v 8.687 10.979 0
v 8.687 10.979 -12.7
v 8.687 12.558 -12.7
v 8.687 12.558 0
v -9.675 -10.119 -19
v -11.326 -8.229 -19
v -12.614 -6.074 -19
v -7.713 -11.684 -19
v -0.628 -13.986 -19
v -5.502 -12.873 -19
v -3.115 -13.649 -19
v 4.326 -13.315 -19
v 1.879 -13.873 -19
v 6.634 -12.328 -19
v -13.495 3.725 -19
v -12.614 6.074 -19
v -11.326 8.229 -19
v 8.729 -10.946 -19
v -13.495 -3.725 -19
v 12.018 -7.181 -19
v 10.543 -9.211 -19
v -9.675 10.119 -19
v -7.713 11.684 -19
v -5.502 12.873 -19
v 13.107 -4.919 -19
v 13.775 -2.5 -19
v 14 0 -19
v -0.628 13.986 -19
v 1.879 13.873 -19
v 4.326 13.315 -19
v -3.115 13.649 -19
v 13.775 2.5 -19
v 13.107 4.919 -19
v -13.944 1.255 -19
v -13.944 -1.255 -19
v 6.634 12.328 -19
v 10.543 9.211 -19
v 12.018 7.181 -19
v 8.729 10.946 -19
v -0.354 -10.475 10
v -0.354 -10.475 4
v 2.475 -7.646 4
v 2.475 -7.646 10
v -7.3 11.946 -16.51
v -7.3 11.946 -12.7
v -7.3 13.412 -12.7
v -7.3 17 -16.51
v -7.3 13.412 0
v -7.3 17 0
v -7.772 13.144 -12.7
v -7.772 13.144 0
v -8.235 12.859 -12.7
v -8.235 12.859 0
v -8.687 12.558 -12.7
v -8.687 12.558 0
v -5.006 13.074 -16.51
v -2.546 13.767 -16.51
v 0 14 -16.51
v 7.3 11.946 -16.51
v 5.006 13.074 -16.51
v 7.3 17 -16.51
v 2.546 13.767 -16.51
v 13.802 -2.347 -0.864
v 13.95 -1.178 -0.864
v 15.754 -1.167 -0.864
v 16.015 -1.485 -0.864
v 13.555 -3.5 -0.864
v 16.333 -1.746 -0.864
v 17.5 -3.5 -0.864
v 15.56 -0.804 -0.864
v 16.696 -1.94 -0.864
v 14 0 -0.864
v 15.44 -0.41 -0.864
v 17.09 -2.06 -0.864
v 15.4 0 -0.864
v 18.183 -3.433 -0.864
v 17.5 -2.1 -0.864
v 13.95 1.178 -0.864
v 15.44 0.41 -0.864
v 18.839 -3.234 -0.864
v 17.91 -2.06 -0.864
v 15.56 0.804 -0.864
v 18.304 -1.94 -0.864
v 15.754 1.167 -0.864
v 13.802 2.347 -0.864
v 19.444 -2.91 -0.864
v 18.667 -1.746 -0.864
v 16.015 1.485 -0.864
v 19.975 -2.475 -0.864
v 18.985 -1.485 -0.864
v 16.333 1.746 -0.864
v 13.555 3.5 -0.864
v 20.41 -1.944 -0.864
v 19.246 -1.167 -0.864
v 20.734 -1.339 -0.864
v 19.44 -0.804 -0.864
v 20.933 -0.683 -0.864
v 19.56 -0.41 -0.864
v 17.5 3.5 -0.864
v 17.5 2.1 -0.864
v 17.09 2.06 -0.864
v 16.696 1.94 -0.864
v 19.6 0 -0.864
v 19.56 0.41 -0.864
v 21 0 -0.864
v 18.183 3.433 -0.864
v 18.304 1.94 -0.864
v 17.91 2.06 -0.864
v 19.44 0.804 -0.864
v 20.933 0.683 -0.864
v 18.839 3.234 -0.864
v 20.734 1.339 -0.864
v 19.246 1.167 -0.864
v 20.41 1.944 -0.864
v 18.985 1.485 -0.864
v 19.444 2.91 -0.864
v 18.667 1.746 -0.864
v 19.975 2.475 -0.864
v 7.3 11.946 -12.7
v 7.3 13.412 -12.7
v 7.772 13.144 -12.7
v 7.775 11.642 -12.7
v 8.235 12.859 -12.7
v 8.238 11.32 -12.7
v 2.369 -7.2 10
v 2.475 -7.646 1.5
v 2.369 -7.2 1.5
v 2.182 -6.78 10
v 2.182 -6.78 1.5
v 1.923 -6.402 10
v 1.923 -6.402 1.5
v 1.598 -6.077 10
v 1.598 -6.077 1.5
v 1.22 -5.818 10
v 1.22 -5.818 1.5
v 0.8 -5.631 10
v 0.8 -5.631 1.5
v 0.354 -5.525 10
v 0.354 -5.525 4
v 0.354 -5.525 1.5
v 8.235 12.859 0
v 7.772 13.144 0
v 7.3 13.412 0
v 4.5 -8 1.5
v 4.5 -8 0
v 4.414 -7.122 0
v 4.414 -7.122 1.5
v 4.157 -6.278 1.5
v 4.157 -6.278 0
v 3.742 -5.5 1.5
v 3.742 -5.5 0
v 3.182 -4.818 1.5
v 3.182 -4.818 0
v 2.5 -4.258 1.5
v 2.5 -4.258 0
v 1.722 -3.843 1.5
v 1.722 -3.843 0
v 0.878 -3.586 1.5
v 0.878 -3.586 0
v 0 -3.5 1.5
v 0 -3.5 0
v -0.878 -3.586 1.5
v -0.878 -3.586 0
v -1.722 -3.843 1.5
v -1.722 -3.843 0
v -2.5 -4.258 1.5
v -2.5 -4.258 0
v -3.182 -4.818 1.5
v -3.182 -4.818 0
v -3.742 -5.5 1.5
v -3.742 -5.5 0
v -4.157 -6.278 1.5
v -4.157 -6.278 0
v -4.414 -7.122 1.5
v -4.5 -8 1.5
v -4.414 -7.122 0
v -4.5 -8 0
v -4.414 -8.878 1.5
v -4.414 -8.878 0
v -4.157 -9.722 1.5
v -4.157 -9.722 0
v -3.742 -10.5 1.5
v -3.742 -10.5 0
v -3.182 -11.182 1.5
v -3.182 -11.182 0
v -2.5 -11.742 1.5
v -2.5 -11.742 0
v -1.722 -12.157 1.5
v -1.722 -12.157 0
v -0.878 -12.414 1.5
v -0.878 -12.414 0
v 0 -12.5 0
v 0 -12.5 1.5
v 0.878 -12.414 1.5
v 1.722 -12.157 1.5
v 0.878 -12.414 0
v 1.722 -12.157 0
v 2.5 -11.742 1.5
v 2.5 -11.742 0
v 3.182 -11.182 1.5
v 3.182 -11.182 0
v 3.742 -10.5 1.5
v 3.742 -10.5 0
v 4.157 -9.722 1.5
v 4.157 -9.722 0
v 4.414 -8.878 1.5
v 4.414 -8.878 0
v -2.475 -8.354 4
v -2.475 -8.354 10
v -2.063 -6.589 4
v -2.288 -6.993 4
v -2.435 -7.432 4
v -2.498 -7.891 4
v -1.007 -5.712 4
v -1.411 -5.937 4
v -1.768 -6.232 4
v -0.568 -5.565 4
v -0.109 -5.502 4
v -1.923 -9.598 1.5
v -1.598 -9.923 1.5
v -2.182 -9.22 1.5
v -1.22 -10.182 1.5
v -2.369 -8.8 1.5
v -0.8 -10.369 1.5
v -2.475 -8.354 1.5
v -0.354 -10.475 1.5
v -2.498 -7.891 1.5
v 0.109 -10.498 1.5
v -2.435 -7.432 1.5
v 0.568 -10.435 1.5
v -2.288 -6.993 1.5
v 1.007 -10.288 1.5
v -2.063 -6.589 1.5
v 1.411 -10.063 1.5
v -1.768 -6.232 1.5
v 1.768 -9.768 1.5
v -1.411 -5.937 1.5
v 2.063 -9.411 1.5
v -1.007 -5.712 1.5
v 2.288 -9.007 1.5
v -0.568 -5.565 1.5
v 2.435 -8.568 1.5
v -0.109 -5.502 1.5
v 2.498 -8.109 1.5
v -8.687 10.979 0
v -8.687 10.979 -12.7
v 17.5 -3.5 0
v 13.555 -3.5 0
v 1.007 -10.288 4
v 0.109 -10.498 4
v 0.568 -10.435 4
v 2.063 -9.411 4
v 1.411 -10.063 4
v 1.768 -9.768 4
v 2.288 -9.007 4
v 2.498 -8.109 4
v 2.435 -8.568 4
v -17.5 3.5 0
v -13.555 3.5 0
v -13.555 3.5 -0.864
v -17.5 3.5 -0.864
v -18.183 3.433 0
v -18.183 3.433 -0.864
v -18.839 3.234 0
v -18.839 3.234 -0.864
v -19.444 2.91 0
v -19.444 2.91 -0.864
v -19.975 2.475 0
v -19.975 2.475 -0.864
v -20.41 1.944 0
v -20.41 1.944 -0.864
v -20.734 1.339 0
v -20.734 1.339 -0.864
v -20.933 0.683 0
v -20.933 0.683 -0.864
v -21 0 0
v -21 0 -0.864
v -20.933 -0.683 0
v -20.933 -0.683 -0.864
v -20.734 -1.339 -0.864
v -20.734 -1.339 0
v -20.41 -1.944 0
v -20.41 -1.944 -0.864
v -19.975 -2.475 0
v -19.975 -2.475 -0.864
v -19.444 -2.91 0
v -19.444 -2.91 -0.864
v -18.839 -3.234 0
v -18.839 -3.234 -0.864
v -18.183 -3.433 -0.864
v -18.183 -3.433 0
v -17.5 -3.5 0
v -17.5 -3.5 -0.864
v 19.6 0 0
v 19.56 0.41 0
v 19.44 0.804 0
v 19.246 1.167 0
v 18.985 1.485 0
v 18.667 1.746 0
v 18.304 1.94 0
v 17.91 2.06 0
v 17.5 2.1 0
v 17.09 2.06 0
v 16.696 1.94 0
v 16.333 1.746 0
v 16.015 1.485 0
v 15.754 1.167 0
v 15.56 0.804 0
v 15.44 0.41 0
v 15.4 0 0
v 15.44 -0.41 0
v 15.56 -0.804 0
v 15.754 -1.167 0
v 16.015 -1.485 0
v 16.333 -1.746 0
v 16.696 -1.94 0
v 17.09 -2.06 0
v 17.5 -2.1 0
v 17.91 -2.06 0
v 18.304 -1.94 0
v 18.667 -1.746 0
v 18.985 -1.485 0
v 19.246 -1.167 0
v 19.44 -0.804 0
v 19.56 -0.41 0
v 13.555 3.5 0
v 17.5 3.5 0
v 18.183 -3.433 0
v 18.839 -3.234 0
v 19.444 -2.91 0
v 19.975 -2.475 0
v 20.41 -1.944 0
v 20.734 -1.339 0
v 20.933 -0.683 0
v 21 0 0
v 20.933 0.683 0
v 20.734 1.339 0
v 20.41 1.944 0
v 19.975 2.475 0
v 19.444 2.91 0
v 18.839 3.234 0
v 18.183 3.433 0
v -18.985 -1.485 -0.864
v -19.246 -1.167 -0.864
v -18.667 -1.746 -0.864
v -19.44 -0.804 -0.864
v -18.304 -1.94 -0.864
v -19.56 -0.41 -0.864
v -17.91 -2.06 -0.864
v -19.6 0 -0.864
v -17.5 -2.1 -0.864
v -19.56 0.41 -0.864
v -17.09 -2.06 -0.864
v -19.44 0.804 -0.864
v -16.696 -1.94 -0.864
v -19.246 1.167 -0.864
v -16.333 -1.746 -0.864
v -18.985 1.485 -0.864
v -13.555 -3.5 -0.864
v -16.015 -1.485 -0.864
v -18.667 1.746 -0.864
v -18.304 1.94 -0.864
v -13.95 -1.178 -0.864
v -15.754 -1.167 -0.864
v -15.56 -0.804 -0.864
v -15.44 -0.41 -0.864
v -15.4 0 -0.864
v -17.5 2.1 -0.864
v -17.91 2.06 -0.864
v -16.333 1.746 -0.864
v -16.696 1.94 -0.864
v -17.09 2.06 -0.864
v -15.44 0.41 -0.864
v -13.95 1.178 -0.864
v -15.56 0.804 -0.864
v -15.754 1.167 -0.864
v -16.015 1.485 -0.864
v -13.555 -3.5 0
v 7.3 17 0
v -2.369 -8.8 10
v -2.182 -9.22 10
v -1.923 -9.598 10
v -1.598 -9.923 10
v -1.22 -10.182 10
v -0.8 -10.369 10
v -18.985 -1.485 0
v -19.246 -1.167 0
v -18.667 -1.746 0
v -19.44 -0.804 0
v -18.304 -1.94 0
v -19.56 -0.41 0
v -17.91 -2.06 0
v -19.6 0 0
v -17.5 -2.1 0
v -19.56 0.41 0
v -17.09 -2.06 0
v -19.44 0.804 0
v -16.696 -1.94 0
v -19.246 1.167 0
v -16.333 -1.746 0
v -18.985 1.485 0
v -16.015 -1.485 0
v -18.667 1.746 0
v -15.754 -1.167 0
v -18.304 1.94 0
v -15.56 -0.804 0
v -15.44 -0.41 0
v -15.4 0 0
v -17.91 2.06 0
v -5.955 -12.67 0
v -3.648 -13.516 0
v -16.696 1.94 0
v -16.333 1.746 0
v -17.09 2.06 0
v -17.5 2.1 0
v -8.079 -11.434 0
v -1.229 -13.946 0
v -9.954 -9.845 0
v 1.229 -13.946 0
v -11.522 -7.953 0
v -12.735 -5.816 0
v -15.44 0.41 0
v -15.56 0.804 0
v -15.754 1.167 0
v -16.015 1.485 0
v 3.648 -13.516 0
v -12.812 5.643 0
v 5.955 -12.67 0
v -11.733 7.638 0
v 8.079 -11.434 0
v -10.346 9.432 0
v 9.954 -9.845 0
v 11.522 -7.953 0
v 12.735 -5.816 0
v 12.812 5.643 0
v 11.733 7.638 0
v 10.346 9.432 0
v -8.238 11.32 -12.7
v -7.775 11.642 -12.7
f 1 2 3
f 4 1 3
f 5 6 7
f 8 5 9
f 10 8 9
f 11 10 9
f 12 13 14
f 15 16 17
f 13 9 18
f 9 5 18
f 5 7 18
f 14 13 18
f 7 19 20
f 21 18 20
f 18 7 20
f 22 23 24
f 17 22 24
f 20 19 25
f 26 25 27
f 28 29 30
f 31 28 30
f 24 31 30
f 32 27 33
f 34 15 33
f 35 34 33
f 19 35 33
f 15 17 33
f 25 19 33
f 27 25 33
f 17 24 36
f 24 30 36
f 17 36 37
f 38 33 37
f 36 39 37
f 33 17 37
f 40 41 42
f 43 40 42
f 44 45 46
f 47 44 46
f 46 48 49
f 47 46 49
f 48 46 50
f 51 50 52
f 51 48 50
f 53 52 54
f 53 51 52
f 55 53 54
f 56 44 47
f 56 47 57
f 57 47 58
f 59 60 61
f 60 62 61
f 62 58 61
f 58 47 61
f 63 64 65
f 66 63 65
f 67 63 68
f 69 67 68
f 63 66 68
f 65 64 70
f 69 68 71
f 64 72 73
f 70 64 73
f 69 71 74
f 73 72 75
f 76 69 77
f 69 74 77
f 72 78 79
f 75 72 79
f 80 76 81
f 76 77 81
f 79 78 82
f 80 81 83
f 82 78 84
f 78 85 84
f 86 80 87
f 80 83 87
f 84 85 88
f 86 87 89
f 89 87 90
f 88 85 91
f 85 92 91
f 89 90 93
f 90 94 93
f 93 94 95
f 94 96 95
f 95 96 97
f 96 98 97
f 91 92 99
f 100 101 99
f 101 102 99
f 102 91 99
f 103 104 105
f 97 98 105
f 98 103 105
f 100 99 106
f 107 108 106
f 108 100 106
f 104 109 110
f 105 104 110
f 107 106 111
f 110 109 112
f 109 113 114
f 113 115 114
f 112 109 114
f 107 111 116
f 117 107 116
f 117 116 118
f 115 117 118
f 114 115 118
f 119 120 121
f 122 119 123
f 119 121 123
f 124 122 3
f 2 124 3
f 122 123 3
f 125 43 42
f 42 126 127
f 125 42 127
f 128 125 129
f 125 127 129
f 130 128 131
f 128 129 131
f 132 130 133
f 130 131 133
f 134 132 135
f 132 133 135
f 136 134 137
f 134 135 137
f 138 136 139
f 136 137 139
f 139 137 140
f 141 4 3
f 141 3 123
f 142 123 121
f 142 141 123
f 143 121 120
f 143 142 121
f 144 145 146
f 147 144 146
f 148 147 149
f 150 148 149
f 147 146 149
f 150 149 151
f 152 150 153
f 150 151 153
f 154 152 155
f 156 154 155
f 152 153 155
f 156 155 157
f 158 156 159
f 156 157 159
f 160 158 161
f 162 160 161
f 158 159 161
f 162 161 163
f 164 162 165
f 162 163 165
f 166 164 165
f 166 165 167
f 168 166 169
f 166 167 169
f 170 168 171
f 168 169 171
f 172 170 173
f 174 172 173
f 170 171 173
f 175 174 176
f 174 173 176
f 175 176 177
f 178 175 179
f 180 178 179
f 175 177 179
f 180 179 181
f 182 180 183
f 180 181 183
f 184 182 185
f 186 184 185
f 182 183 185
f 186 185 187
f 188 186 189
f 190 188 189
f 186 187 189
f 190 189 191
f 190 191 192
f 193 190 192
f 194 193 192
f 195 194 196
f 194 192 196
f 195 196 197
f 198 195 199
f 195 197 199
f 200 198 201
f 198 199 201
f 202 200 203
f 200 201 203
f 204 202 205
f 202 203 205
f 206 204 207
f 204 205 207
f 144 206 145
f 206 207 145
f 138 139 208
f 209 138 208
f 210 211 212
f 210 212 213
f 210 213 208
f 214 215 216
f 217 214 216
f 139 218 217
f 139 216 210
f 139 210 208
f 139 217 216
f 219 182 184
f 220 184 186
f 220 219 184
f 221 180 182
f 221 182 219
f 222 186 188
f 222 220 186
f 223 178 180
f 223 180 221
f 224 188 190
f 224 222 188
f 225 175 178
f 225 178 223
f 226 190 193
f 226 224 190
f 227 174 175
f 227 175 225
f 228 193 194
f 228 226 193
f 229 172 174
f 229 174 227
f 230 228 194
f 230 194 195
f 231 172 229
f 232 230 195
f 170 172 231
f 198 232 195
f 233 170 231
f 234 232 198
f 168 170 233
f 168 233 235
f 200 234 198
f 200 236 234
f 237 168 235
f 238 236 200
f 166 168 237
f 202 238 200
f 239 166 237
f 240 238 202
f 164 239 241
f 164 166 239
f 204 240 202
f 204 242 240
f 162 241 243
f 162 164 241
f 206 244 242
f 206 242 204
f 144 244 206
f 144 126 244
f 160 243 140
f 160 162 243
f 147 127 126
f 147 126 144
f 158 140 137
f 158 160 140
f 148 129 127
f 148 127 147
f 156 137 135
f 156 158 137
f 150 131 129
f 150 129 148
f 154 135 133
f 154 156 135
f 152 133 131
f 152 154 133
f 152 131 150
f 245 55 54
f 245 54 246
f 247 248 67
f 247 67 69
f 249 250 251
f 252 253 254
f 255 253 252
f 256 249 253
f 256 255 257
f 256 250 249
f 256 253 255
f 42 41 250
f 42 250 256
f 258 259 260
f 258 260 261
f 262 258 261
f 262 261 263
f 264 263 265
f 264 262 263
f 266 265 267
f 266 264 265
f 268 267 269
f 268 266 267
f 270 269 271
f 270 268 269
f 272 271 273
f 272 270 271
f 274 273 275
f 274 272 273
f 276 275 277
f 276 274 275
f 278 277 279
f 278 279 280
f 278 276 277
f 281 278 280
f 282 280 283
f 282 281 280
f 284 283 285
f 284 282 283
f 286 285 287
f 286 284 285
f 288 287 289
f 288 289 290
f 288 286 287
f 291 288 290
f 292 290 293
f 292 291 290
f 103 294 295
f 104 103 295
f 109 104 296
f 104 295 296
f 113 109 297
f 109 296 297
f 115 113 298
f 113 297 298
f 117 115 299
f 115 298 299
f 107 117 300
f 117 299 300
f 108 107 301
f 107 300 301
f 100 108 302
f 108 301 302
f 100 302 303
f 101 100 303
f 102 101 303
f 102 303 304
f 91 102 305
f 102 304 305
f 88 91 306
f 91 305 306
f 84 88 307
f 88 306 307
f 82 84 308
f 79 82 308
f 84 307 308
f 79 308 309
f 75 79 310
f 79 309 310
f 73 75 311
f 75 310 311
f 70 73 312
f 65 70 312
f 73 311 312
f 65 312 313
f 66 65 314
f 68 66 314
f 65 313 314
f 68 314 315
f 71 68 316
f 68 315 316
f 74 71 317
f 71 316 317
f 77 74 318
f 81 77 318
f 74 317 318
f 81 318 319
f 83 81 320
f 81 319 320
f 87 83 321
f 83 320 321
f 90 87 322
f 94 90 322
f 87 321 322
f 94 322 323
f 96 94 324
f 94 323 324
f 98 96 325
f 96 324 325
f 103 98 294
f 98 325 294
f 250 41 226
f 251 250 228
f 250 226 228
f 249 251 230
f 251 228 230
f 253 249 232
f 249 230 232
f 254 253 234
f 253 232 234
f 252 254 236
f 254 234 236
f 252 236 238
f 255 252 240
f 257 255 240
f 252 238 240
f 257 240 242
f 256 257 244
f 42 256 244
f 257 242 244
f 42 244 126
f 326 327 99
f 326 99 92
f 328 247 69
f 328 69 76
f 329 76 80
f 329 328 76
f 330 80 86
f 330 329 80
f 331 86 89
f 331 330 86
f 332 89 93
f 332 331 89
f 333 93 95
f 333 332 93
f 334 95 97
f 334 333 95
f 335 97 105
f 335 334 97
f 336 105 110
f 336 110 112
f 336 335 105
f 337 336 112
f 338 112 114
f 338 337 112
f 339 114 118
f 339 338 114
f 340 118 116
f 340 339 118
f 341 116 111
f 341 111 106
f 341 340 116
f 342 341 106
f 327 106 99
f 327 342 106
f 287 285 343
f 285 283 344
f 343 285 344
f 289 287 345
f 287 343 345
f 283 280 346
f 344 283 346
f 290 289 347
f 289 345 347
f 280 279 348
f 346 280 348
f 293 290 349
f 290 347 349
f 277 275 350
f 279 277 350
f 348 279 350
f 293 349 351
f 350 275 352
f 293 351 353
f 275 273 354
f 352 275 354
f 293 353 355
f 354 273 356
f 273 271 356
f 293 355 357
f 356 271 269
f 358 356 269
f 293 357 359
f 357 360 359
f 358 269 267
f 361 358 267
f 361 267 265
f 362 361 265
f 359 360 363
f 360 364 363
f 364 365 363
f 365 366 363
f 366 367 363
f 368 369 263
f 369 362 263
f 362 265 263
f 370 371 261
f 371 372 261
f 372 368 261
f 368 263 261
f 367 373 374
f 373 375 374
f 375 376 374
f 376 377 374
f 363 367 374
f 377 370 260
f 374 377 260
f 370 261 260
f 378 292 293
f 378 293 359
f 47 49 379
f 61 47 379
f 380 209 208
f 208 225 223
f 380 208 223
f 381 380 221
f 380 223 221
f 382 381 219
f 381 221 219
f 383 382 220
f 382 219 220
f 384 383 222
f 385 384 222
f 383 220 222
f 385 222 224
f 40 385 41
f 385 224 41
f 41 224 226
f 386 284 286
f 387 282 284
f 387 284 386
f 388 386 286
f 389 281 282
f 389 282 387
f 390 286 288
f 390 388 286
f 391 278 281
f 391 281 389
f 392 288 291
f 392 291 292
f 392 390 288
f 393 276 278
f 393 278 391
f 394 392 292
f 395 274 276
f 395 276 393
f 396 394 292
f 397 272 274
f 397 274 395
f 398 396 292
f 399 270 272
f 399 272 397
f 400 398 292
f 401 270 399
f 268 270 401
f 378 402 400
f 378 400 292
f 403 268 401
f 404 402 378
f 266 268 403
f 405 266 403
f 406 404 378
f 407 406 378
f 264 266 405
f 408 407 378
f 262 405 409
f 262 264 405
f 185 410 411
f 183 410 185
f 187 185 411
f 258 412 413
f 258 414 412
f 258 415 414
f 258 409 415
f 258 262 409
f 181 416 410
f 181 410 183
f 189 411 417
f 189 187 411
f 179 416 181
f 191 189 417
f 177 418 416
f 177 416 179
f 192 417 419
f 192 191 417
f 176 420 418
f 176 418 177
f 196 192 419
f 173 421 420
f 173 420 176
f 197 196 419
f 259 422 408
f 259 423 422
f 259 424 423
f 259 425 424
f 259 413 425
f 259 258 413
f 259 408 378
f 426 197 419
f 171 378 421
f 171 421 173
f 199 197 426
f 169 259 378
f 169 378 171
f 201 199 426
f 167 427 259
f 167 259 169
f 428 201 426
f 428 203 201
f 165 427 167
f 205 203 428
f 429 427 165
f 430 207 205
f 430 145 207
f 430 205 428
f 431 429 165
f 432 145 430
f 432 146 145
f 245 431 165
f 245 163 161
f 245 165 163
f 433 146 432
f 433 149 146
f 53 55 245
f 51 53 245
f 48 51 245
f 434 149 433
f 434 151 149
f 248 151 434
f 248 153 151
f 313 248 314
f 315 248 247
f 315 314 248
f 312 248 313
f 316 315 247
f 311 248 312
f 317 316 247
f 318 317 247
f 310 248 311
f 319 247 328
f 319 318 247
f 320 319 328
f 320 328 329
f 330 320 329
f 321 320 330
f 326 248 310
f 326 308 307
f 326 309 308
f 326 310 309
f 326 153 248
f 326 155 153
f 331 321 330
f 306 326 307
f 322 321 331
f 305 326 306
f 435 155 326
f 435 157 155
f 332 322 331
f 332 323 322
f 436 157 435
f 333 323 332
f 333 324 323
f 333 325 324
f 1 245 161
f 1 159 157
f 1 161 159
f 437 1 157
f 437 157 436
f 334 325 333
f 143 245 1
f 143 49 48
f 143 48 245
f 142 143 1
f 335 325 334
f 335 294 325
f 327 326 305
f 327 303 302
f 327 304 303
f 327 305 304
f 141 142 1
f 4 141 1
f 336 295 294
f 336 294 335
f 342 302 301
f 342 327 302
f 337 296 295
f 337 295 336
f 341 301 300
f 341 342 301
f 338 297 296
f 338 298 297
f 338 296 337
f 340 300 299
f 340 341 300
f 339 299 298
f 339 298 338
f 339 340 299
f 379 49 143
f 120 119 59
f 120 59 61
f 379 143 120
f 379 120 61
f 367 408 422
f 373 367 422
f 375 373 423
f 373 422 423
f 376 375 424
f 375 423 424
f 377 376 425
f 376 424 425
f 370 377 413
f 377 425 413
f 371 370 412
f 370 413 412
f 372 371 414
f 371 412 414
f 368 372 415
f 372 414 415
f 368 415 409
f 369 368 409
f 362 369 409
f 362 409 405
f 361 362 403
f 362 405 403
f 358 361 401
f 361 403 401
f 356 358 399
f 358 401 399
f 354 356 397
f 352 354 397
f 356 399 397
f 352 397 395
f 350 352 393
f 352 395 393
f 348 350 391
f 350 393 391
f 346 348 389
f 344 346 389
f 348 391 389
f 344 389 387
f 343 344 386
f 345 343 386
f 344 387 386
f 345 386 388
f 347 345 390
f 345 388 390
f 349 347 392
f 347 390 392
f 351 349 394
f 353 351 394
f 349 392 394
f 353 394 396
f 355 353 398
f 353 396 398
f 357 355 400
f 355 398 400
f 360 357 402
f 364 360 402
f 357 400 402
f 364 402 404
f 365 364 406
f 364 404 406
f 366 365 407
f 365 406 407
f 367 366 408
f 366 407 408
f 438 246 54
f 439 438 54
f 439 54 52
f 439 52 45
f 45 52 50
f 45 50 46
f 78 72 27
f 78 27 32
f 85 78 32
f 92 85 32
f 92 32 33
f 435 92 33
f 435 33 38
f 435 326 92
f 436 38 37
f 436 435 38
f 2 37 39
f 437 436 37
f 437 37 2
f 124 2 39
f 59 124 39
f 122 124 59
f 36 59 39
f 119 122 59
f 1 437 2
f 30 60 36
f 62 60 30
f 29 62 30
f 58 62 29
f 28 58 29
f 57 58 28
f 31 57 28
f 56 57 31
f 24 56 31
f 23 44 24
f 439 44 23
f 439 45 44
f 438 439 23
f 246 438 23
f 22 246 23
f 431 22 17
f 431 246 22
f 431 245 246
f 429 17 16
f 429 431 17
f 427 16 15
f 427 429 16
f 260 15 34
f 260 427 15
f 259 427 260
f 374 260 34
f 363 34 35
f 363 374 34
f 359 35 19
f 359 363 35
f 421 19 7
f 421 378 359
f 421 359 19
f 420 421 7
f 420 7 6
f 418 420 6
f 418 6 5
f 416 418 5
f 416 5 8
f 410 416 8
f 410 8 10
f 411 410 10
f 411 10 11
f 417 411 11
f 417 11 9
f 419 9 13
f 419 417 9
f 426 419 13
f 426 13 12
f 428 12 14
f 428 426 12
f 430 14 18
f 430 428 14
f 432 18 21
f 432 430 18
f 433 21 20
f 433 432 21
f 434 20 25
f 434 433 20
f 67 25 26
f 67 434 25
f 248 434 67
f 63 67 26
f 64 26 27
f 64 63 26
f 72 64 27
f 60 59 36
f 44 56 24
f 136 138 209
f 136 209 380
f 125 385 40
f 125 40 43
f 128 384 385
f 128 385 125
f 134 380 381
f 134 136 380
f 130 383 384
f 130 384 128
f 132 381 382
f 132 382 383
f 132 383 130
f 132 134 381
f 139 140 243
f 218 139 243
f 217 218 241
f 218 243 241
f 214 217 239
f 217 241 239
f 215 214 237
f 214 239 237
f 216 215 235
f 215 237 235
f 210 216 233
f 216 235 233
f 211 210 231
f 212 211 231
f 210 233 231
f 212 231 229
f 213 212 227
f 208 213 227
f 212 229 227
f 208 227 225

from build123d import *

# Parameters (mm, degrees)
F0_R      = 14
F5_DEPTH  = 19
F2_W      = 14.6
F2_H      = 5.053871
F6_DEPTH  = 16.51
F7_DEPTH  = 12.7
F3_R      = 2.1
F8_DEPTH  = 0.8636
F9_DEPTH  = 10
F10_DEPTH = 4
F4_R      = 4.5
F11_DEPTH = 1.5


with BuildPart() as f5:
    # F0 (on Top) → F5 (new body)
    with BuildSketch(Plane.XY):
        Circle(F0_R)
    extrude(amount=-F5_DEPTH)

    # F2 (on Top) → F6 (join)
    with BuildSketch(Plane.XY):
        with Locations((0, 14.473064)):
            Rectangle(F2_W, F2_H)
    extrude(amount=-F6_DEPTH)

    # F1 (on Top) → F7 (join)
    with BuildSketch(Plane.XY):
        with BuildLine():
            ThreePointArc((-8.6868, 10.979048), (0, 14), (8.6868, 10.979048))
            Line((8.6868, 10.979048), (8.6868, 12.55836))
            ThreePointArc((8.6868, 12.55836), (0, 15.27), (-8.6868, 12.55836))
            Line((-8.6868, 12.55836), (-8.6868, 10.979048))
        make_face()
    extrude(amount=-F7_DEPTH)

    # F3 (on Top) → F8 (join)
    with BuildSketch(Plane.XY):
        with BuildLine():
            Line((17.5, 3.5), (-17.5, 3.5))
            ThreePointArc((-17.5, 3.5), (-21, 0), (-17.5, -3.5))
            Line((-17.5, -3.5), (17.5, -3.5))
            ThreePointArc((17.5, -3.5), (21, 0), (17.5, 3.5))
        make_face()
        with Locations((-17.5, 0)):
            Circle(F3_R, mode=Mode.SUBTRACT)
        with Locations((17.5, 0)):
            Circle(F3_R, mode=Mode.SUBTRACT)
    extrude(amount=-F8_DEPTH)

    # F4 (on Top) → F9 (join)
    with BuildSketch(Plane.XY):
        Polygon((0.353553, -5.525126), (-2.474874, -8.353553), (-0.353553, -10.474874), (2.474874, -7.646447), align=None)
        with BuildLine():
            Line((-0.353553, -10.474874), (-2.474874, -8.353553))
            ThreePointArc((-2.474874, -8.353553), (-1.767767, -9.767767), (-0.353553, -10.474874))
        make_face()
        with BuildLine():
            ThreePointArc((2.474874, -7.646447), (1.767767, -6.232233), (0.353553, -5.525126))
            Line((0.353553, -5.525126), (2.474874, -7.646447))
        make_face()
    extrude(amount=F9_DEPTH)

    # F4 (on Top) → F10 (join)
    with BuildSketch(Plane.XY):
        with BuildLine():
            Line((2.474874, -7.646447), (-0.353553, -10.474874))
            ThreePointArc((-0.353553, -10.474874), (1.767767, -9.767767), (2.474874, -7.646447))
        make_face()
        with BuildLine():
            ThreePointArc((0.353553, -5.525126), (-1.767767, -6.232233), (-2.474874, -8.353553))
            Line((-2.474874, -8.353553), (0.353553, -5.525126))
        make_face()
    extrude(amount=F10_DEPTH)

    # F4 (on Top) → F11 (join)
    with BuildSketch(Plane.XY):
        with Locations((0, -8)):
            Circle(F4_R)
        with BuildLine():
            ThreePointArc((-0.353553, -10.474874), (-1.767767, -9.767767), (-2.474874, -8.353553))
            ThreePointArc((-2.474874, -8.353553), (-1.767767, -6.232233), (0.353553, -5.525126))
            ThreePointArc((0.353553, -5.525126), (1.767767, -6.232233), (2.474874, -7.646447))
            ThreePointArc((2.474874, -7.646447), (1.767767, -9.767767), (-0.353553, -10.474874))
        make_face(mode=Mode.SUBTRACT)
        with BuildLine():
            Line((2.474874, -7.646447), (-0.353553, -10.474874))
            ThreePointArc((-0.353553, -10.474874), (1.767767, -9.767767), (2.474874, -7.646447))
        make_face()
    extrude(amount=F11_DEPTH)


solid = f5.part
